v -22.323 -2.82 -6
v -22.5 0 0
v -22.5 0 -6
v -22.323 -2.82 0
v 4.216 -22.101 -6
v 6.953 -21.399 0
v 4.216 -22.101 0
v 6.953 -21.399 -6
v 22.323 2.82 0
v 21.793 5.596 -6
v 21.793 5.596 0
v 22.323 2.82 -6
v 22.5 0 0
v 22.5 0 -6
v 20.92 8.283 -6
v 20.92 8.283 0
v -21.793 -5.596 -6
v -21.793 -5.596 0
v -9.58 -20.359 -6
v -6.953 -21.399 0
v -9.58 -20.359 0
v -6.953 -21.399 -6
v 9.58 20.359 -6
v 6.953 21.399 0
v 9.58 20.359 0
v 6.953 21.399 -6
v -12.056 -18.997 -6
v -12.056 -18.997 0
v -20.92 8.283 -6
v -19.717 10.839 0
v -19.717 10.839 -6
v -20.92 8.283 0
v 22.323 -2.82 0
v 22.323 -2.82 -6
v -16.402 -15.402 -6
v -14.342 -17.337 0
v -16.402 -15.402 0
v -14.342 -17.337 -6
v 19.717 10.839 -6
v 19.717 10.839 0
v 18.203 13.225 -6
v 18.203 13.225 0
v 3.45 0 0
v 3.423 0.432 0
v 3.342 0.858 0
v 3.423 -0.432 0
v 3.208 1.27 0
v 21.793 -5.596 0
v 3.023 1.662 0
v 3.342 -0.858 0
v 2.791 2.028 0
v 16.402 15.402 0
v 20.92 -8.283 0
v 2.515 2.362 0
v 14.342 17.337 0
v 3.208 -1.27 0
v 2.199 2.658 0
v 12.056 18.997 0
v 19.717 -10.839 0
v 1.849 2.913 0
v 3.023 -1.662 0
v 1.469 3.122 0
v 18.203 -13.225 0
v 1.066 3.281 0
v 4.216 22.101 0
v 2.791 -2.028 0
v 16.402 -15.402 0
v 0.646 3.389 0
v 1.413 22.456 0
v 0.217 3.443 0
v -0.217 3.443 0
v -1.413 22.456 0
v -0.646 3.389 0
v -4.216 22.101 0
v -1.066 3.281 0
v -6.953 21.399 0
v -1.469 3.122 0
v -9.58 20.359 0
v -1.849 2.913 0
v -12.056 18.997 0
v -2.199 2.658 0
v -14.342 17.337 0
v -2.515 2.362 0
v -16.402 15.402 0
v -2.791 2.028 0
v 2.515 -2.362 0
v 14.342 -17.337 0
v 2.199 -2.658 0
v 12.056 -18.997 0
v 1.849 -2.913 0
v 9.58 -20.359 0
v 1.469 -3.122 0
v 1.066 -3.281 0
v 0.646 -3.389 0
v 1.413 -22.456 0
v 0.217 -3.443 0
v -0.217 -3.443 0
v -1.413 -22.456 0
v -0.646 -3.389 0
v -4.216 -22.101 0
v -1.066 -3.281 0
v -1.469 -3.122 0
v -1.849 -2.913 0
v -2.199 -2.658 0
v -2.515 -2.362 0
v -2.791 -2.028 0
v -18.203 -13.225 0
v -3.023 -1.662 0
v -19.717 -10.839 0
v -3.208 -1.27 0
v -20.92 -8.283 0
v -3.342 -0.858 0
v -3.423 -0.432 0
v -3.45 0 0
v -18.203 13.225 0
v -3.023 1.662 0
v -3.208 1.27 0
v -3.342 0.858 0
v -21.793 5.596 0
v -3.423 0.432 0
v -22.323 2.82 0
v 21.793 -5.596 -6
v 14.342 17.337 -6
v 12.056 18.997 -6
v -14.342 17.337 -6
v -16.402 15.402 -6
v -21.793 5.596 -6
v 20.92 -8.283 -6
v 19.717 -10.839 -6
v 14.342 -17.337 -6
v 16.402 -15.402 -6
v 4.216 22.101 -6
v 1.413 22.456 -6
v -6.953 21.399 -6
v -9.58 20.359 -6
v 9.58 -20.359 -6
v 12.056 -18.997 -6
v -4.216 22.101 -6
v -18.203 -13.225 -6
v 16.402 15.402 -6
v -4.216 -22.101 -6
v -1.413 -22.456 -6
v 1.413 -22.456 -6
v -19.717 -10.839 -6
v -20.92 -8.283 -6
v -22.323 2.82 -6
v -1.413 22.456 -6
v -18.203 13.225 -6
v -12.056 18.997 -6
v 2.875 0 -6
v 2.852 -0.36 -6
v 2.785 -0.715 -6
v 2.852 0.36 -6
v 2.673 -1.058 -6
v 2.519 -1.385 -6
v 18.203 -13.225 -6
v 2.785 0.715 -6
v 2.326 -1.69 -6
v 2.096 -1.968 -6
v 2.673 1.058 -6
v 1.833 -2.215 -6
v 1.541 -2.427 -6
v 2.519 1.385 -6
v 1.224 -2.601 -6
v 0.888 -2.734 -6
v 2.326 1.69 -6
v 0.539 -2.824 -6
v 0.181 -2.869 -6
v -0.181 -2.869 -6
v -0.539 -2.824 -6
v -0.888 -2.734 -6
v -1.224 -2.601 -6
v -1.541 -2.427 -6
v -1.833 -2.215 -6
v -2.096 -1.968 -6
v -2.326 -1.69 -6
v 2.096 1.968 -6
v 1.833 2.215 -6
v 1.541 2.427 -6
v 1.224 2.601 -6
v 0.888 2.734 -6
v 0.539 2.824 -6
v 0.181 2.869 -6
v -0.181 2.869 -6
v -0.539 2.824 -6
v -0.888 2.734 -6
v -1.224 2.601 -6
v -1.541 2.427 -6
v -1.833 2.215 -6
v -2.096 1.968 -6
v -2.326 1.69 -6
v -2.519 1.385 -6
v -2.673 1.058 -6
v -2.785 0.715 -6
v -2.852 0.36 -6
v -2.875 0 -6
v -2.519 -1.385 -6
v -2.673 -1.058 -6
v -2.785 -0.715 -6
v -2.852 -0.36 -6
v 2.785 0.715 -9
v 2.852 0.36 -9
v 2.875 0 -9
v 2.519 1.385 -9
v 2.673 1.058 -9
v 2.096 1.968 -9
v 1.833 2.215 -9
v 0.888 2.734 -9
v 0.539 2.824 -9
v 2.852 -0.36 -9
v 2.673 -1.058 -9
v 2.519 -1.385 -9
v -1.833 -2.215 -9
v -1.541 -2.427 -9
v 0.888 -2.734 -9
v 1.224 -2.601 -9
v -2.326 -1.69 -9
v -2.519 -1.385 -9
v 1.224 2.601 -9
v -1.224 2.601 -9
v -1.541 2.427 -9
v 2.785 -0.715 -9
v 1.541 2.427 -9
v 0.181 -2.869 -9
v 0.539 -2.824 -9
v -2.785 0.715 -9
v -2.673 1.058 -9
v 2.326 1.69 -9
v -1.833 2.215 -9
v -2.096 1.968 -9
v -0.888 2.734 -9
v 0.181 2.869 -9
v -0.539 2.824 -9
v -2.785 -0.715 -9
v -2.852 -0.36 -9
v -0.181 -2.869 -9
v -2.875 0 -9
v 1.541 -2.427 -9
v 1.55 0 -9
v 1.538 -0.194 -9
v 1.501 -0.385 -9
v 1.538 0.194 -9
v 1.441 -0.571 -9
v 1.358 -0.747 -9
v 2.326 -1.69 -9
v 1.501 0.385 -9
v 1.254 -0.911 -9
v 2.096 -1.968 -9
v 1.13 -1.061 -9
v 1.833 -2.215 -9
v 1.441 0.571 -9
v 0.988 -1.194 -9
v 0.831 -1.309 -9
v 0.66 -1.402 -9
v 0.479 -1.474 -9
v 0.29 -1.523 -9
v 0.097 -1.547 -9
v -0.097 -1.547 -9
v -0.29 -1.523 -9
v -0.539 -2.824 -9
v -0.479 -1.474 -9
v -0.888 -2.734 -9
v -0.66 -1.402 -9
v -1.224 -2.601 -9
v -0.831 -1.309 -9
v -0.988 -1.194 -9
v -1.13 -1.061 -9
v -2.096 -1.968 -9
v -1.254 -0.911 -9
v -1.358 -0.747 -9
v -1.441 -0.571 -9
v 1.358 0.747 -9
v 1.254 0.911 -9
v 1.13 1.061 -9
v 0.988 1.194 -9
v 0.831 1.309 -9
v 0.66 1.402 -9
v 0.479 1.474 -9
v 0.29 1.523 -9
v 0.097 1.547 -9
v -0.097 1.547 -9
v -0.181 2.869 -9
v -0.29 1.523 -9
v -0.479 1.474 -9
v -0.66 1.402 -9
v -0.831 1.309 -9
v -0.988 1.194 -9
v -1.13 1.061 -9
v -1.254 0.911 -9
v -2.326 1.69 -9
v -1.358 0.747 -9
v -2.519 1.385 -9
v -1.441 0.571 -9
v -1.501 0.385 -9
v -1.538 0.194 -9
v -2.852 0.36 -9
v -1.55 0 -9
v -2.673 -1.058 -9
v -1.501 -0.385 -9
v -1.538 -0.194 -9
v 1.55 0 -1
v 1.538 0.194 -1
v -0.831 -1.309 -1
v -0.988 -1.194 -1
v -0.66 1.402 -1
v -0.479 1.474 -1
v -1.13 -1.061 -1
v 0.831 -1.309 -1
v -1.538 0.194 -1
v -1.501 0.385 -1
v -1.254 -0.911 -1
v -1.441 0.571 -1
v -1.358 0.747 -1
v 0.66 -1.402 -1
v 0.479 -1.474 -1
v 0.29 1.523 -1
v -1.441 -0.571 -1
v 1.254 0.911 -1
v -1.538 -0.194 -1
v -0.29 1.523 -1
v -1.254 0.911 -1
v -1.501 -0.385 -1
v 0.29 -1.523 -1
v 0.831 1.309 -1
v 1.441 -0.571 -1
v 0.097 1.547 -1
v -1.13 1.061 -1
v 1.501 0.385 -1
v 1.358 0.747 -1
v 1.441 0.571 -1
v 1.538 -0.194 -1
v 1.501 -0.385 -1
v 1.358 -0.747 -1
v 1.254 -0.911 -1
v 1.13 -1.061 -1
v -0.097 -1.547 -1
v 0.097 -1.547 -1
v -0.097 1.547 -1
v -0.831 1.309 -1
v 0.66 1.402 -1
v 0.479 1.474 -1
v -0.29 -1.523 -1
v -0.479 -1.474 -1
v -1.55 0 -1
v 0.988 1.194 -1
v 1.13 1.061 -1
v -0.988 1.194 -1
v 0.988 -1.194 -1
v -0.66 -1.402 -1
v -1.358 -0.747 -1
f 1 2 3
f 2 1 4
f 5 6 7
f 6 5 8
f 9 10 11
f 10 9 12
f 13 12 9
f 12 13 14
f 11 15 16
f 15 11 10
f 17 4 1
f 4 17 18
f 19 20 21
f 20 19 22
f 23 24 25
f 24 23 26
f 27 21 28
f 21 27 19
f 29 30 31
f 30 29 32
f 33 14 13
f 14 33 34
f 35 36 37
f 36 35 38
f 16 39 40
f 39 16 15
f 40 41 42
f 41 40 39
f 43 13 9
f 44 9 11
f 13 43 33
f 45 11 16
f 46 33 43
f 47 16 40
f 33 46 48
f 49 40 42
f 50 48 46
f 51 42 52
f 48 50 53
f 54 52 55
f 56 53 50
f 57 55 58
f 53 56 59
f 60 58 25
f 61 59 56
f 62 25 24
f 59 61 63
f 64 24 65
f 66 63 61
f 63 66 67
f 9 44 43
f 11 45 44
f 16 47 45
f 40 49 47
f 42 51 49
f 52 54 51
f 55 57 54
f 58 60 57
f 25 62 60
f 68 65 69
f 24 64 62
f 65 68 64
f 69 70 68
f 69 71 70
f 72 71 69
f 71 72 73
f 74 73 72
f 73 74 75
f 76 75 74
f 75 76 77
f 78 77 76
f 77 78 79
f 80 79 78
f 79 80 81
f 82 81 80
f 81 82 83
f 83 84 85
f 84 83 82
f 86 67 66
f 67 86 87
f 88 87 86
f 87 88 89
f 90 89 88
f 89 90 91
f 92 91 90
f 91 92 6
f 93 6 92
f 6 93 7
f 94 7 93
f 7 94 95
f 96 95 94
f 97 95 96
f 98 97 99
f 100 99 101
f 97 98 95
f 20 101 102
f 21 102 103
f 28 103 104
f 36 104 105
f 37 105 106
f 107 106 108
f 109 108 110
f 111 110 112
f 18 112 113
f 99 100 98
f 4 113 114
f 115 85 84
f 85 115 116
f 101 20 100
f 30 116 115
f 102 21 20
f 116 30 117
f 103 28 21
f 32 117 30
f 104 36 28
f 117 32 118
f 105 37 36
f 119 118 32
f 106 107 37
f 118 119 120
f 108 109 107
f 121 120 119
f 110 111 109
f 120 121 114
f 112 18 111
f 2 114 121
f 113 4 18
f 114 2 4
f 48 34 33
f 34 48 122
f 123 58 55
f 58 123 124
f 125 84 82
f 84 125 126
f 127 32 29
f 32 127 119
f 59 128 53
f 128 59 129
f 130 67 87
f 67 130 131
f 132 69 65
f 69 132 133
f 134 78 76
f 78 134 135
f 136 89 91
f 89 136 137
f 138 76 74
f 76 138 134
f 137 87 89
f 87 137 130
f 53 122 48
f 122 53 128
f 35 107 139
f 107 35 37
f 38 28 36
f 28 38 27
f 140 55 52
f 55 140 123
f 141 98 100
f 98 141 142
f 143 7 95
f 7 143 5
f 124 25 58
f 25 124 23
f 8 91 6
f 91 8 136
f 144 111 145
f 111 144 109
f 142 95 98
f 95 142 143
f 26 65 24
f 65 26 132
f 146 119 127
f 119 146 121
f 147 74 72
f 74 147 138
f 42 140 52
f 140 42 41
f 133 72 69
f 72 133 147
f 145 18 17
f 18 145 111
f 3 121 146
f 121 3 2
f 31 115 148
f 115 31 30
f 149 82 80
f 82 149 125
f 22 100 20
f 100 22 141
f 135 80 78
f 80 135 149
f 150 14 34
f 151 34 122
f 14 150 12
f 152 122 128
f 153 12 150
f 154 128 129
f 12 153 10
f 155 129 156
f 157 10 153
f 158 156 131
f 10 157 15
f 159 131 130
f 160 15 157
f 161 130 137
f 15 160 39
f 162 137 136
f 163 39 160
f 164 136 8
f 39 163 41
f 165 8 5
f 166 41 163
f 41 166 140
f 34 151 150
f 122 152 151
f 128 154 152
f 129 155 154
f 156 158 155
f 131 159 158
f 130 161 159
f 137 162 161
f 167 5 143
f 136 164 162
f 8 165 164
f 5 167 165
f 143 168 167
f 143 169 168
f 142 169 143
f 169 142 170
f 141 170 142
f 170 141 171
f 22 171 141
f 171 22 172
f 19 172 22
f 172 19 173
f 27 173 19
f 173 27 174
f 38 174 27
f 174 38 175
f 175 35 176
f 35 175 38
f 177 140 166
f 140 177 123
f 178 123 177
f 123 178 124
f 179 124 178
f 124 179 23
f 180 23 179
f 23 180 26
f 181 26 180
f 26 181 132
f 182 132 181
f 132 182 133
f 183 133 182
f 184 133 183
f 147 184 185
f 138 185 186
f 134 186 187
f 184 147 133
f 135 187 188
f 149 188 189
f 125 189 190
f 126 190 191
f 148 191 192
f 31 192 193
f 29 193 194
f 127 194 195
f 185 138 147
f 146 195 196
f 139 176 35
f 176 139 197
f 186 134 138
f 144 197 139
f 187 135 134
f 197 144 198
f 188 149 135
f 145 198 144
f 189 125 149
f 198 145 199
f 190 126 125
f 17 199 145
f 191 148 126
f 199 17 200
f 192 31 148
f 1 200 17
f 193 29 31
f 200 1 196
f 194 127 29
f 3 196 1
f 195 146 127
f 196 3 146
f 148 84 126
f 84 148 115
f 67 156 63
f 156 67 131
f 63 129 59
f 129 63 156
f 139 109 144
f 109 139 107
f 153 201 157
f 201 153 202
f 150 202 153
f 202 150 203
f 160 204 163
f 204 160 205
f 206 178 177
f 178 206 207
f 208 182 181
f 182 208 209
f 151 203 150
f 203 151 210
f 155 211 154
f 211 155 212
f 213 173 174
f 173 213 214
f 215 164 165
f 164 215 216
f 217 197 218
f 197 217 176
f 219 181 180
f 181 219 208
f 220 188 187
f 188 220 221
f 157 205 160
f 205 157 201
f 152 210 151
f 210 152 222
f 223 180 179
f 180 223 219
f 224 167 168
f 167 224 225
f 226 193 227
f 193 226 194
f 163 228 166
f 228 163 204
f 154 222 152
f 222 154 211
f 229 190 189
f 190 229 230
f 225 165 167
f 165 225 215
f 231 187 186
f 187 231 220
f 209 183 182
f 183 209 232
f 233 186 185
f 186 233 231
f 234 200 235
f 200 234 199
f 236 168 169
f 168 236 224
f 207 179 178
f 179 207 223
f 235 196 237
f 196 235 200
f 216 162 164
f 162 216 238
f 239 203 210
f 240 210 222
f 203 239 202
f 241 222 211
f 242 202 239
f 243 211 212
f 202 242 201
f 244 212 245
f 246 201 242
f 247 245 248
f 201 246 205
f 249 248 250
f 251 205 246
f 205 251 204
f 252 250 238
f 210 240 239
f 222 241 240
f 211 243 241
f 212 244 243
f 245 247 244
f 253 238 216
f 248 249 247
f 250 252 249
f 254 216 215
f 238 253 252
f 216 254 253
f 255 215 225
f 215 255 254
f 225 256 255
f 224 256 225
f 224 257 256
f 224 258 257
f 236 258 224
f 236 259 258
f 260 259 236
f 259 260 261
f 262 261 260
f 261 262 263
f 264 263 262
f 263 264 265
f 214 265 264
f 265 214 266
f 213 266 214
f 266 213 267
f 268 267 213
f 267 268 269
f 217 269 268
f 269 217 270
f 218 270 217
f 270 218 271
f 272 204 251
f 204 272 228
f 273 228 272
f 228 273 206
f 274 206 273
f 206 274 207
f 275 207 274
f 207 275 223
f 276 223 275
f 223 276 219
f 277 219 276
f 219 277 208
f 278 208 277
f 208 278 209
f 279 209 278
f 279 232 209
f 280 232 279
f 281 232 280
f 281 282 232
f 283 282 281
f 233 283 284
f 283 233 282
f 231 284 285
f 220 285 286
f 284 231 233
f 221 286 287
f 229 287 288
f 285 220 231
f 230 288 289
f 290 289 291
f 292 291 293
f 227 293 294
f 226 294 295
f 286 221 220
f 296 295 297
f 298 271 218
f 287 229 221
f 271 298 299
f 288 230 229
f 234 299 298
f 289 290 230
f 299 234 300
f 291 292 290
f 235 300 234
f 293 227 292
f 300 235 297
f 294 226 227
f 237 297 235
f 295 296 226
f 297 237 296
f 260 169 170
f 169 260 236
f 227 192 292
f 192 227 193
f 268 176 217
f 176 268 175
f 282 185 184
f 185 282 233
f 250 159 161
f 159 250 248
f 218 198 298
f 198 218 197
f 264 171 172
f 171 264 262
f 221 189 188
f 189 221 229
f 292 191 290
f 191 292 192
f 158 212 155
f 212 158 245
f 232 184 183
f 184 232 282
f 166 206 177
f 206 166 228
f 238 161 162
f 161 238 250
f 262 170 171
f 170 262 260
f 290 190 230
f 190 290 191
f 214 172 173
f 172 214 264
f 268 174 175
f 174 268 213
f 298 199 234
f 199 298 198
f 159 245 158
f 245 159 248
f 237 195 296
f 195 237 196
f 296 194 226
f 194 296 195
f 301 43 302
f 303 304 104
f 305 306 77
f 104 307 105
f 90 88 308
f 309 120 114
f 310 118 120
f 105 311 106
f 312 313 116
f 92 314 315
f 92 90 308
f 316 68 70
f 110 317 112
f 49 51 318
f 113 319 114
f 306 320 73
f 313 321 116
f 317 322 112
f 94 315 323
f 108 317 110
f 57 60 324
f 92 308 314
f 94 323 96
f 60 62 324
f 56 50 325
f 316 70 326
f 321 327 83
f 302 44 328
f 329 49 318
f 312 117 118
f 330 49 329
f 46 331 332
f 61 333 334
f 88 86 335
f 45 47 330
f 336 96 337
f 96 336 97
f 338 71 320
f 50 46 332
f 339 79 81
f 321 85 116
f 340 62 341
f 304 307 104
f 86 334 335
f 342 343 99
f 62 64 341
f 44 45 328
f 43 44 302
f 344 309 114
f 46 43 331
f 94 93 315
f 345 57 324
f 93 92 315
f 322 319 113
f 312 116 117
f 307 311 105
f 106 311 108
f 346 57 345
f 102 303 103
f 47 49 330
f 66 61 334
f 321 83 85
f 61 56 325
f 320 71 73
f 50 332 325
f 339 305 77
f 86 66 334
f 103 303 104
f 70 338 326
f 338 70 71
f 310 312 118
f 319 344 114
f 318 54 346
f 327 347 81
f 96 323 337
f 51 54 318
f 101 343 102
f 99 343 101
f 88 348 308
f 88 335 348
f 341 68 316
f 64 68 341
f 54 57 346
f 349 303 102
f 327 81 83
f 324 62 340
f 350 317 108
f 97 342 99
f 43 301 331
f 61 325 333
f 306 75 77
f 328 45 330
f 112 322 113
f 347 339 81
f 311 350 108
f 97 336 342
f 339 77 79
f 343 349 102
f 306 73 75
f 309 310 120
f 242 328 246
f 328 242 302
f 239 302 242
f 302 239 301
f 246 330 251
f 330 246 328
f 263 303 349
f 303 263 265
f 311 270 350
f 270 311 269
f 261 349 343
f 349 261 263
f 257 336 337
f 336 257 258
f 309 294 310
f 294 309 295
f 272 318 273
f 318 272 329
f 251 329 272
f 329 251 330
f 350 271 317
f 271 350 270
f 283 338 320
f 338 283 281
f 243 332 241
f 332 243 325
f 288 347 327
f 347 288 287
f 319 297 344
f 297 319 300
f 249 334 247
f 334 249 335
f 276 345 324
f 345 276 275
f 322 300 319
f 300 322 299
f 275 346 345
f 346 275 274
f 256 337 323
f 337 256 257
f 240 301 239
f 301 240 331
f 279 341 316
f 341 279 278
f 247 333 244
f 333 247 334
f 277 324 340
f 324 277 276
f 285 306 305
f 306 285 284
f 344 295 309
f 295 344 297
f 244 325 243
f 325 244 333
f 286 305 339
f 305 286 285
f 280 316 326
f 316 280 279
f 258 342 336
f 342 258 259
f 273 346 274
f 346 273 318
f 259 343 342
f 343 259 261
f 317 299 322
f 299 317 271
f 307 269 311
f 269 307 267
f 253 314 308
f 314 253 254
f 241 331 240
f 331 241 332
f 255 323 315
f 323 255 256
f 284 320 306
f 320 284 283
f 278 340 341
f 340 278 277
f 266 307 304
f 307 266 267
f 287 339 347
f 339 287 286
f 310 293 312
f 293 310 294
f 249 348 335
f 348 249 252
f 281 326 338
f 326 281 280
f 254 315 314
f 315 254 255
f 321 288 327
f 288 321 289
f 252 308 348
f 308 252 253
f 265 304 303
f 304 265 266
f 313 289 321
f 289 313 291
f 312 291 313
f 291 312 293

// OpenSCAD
$fn = 50;

difference() {
	union() {
		translate(v = [0, 0, -6.0]) {
			cylinder(h = 6, r = 22.5);
		}
		#translate(v = [0, 0, -9.0]) {
			cylinder(h = 9, r = 2.875);
		}
	}
	union() {
		translate(v = [0, 0, 0]) {
			rotate(a = [0, 0, 0]) {
				difference() {
					union() {
						translate(v = [0, 0, -9.0]) {
							cylinder(h = 9, r = 1.25);
						}
						translate(v = [0, 0, -1.0]) {
							cylinder(h = 1.0, r1 = 1.55, r2 = 3.45);
						}
						translate(v = [0, 0, -9.0]) {
							cylinder(h = 9, r = 1.55);
						}
						translate(v = [0, 0, -9.0]) {
							cylinder(h = 9, r = 1.25);
						}
					}
					union();
				}
			}
		}
	}
}
